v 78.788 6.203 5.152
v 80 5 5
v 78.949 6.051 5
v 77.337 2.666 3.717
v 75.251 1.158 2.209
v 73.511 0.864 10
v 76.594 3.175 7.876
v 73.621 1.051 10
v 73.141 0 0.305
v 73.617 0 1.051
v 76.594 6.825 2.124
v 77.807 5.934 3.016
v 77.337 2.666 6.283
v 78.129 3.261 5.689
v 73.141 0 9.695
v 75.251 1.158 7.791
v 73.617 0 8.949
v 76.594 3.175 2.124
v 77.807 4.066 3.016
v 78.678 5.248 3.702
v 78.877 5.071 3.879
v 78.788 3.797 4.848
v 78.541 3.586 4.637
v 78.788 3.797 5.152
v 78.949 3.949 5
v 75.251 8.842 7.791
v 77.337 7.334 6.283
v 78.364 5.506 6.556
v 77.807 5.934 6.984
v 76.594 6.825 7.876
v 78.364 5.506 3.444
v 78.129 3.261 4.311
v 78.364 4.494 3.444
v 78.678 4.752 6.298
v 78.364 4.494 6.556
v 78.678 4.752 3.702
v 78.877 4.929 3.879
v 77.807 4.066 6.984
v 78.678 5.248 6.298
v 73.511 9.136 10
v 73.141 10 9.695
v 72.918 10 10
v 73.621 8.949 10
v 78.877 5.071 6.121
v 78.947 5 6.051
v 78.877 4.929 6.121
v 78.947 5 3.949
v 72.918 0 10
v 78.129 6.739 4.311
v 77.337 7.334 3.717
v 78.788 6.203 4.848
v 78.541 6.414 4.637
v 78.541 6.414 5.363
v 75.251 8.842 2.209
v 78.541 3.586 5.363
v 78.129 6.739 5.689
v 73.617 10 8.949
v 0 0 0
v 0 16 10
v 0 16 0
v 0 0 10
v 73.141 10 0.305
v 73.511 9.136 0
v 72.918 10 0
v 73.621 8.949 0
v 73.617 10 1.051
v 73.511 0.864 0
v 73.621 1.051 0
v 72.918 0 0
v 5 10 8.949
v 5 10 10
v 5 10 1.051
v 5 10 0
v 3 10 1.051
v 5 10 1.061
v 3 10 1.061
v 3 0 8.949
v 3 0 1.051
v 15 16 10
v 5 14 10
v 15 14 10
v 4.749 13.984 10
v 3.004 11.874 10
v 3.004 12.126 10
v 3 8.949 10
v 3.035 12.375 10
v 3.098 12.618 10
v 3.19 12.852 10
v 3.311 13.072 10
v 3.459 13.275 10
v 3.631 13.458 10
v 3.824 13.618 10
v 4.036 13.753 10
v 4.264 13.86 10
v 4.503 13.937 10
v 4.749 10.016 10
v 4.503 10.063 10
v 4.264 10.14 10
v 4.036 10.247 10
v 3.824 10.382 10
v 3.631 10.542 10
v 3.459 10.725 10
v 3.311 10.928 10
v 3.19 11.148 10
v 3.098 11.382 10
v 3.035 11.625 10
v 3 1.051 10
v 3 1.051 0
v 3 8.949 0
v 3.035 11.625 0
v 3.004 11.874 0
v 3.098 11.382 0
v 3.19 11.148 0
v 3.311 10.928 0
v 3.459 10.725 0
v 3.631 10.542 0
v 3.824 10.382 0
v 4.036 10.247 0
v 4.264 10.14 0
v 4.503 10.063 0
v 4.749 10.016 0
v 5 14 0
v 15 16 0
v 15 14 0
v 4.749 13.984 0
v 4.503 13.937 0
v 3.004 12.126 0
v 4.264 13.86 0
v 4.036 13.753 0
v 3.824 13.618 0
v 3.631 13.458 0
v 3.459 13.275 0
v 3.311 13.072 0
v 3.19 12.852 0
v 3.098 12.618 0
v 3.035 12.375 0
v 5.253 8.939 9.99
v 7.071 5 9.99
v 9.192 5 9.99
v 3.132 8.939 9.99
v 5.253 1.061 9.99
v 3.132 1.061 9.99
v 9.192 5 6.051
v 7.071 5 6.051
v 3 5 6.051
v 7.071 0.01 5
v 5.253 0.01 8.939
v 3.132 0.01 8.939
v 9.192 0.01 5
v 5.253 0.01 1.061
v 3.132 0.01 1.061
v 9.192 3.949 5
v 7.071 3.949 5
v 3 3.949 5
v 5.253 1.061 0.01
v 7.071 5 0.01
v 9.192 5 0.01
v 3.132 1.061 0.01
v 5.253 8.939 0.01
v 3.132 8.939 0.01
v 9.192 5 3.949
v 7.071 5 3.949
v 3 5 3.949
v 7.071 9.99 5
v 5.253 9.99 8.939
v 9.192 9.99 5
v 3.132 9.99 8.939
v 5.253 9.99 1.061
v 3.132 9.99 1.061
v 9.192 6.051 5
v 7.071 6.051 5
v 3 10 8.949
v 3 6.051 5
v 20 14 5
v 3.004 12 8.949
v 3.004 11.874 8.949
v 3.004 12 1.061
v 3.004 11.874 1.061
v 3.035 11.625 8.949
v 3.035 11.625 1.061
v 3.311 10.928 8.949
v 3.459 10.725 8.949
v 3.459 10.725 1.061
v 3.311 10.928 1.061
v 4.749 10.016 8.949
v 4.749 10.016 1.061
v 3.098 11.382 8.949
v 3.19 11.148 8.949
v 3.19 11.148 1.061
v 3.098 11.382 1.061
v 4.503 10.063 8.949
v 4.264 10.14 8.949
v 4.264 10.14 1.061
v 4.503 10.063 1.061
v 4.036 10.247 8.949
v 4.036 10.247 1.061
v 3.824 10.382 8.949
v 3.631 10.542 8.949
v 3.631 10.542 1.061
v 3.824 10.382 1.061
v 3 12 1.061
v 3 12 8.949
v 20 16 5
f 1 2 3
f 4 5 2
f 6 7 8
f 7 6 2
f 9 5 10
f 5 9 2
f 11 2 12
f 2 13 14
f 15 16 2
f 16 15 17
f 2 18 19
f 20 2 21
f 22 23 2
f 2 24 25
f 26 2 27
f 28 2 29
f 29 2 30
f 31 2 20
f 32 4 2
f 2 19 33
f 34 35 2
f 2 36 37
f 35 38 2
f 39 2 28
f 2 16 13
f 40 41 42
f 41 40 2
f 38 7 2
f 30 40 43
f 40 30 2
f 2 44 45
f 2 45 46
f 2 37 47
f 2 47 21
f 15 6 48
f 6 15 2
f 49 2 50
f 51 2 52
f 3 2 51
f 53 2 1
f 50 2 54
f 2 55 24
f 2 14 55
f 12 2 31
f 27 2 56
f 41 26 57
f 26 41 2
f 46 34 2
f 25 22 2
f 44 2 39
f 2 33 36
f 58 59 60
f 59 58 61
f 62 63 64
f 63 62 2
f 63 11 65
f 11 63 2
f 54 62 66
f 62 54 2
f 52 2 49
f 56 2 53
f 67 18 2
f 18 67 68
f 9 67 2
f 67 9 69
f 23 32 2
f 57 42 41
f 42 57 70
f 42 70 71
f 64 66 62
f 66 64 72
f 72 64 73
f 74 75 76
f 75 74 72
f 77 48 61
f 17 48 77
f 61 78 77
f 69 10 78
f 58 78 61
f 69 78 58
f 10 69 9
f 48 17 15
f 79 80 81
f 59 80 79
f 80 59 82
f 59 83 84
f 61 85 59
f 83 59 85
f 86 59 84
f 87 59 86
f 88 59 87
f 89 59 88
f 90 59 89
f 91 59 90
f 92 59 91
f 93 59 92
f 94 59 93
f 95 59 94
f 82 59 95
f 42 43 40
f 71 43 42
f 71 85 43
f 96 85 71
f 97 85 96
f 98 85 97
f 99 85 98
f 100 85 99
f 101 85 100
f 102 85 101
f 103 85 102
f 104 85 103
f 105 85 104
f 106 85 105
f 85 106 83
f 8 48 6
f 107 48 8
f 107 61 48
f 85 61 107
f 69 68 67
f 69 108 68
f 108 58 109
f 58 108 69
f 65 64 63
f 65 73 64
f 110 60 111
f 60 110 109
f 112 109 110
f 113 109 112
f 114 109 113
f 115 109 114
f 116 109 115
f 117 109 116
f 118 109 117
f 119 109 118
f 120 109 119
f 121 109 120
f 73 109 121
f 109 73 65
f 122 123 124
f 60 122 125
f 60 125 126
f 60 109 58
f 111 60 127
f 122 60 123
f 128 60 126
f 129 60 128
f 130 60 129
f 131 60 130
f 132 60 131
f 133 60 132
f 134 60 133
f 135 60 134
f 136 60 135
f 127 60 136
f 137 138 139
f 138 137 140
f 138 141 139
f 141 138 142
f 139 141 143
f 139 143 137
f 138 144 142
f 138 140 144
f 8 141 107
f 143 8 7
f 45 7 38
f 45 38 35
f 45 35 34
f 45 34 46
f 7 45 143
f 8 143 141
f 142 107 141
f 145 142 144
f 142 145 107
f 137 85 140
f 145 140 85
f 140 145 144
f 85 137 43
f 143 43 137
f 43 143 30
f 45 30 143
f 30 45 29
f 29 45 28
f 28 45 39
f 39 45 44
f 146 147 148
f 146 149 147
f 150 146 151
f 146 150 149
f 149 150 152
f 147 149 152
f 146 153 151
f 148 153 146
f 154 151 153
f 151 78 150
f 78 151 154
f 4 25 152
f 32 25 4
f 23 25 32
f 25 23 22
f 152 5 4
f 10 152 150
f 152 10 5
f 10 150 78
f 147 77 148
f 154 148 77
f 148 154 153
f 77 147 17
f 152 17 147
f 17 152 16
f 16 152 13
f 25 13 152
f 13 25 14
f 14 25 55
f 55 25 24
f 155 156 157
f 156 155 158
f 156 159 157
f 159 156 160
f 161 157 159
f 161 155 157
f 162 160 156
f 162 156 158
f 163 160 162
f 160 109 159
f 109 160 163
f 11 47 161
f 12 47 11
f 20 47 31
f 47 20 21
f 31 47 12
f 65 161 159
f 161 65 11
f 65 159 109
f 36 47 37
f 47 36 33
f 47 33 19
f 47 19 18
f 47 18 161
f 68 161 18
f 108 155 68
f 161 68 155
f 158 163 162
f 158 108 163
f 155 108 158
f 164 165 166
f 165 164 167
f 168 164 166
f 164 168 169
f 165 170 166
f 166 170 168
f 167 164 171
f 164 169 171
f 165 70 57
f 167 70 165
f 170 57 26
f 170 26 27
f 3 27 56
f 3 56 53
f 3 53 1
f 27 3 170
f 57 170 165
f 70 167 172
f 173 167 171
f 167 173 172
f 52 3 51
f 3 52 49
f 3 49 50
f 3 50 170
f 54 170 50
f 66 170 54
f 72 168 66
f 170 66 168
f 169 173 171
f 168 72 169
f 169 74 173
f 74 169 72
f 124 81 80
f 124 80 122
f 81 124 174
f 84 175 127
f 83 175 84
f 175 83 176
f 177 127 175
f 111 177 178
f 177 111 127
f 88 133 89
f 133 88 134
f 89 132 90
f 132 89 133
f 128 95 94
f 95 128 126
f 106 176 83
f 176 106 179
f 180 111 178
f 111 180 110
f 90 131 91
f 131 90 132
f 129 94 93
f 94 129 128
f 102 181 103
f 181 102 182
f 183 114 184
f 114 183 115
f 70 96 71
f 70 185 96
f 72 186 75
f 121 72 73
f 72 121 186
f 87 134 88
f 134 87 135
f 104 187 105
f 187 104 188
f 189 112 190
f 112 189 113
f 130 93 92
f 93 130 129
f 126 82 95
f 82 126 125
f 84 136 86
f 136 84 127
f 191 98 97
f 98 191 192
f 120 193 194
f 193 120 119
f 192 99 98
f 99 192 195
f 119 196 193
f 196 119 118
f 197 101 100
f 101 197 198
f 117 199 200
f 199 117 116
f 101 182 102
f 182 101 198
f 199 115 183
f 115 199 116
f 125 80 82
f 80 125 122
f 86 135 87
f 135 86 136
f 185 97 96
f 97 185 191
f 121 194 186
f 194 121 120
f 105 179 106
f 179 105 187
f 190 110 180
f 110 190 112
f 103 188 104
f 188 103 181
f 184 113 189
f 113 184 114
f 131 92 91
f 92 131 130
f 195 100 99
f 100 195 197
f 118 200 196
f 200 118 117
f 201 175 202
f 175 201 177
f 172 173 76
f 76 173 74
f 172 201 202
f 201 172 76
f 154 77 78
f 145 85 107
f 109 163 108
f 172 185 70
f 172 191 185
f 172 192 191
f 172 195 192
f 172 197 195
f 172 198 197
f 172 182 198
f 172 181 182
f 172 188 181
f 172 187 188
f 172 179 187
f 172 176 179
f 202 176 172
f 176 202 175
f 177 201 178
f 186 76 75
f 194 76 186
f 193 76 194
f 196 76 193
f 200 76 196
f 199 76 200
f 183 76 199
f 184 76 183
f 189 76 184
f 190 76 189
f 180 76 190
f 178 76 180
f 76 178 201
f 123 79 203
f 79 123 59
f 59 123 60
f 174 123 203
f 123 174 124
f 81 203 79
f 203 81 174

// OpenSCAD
// ************* Credits part *************

// Programmed by Fryns - July 2014

// ************* Declaration part *************

/* [Peg] */
TopThickness=3;
PegLength=80;
PegWidth=10;
PegThickness=1.5;

/* [Hook] */
HookLength=20;
HookSpace=4;
HookThickness=2;

/* [Hidden] */
Manifoldfix=0.01;

// preview[view:north, tilt:top]

// ************* Executable part *************

rotate([90,0,90])
Assembly();


// ************* Module part *************
module Assembly(){
	cube([PegWidth+HookThickness+HookSpace,PegWidth,TopThickness]); // peg top
	intersection(){
		PegSolid();
		PegSkeleton();
	}
	PegHook();
}

module PegSolid(){	// makes solid version of peg
	intersection(){	// makes peg point
		translate([PegWidth/2,PegWidth/2,0])
			cylinder(h = PegLength, r1 = PegLength, r2 = 0,$fn=50, center = false); 
		cube([PegWidth,PegWidth,PegLength]);
	}
}

module PegHook(){
	difference(){	// makes hook curve
		translate([PegWidth,0,0])
			cube([HookSpace,PegWidth,HookLength]);
		translate([PegWidth+HookSpace/2,PegWidth/2,HookSpace/2+TopThickness])
			rotate([90,0,0])
				cylinder(h = PegWidth+Manifoldfix, r = HookSpace/2,$fn=50 ,center = true);
		translate([PegWidth,0,HookSpace/2+TopThickness])
			cube([HookSpace,PegWidth,HookLength]);
		translate([PegWidth,PegThickness/2*sqrt(2),TopThickness])
			cube([HookSpace/2,PegWidth-PegThickness*sqrt(2)+Manifoldfix,HookLength]);
	}

	intersection(){	// makes hook 
		translate([PegWidth+HookSpace,PegWidth/2,-HookLength])
			rotate([45,0,0])
		cube([HookThickness,HookLength*sqrt(2),HookLength*sqrt(2)]);
		translate([PegWidth+HookSpace,0,0])
		cube([HookThickness,PegWidth,HookLength]);
	}
}

module PegSkeleton(){	// makes peg skeleton from 4 quarters
	translate([0,-Manifoldfix,0])
	PegSkeletonQuarter();
	translate([PegWidth+Manifoldfix,0,0])
		rotate([0,0,90])
	PegSkeletonQuarter();
	translate([PegWidth,PegWidth+Manifoldfix,0])
		rotate([0,0,180])
	PegSkeletonQuarter();
	translate([-Manifoldfix,PegWidth,0])
		rotate([0,0,-90])
	PegSkeletonQuarter();
}

module PegSkeletonQuarter(){	// makes peg skeleton quarter
	intersection(){
		translate([PegWidth/2,PegWidth/2,0])
			rotate([0,0,45])
		cube([PegWidth,PegWidth,PegLength]);
		PegSkeletonIntermidiate();
	}
}

module PegSkeletonIntermidiate(){	// makes peg skeleton structure for quarter
	translate([PegWidth/2,PegWidth/2,(PegWidth+TopThickness)/2*sqrt(2)])
		rotate([-90,0,0])
			rotate([0,0,45])
	difference(){		// makes peg cross
		cube([PegWidth,PegWidth,PegWidth/2]);
		translate([PegThickness,PegThickness,0])
			cube([PegWidth,PegWidth,PegWidth]);

	}
	translate([PegWidth/2,PegWidth/2,0])
		rotate([0,0,45])
	difference(){		// makes peg cross
		cube([PegWidth,PegWidth,PegLength]);
		translate([PegThickness/2,PegThickness/2,0])
				cube([PegWidth,PegWidth,PegLength]);
	}
}
